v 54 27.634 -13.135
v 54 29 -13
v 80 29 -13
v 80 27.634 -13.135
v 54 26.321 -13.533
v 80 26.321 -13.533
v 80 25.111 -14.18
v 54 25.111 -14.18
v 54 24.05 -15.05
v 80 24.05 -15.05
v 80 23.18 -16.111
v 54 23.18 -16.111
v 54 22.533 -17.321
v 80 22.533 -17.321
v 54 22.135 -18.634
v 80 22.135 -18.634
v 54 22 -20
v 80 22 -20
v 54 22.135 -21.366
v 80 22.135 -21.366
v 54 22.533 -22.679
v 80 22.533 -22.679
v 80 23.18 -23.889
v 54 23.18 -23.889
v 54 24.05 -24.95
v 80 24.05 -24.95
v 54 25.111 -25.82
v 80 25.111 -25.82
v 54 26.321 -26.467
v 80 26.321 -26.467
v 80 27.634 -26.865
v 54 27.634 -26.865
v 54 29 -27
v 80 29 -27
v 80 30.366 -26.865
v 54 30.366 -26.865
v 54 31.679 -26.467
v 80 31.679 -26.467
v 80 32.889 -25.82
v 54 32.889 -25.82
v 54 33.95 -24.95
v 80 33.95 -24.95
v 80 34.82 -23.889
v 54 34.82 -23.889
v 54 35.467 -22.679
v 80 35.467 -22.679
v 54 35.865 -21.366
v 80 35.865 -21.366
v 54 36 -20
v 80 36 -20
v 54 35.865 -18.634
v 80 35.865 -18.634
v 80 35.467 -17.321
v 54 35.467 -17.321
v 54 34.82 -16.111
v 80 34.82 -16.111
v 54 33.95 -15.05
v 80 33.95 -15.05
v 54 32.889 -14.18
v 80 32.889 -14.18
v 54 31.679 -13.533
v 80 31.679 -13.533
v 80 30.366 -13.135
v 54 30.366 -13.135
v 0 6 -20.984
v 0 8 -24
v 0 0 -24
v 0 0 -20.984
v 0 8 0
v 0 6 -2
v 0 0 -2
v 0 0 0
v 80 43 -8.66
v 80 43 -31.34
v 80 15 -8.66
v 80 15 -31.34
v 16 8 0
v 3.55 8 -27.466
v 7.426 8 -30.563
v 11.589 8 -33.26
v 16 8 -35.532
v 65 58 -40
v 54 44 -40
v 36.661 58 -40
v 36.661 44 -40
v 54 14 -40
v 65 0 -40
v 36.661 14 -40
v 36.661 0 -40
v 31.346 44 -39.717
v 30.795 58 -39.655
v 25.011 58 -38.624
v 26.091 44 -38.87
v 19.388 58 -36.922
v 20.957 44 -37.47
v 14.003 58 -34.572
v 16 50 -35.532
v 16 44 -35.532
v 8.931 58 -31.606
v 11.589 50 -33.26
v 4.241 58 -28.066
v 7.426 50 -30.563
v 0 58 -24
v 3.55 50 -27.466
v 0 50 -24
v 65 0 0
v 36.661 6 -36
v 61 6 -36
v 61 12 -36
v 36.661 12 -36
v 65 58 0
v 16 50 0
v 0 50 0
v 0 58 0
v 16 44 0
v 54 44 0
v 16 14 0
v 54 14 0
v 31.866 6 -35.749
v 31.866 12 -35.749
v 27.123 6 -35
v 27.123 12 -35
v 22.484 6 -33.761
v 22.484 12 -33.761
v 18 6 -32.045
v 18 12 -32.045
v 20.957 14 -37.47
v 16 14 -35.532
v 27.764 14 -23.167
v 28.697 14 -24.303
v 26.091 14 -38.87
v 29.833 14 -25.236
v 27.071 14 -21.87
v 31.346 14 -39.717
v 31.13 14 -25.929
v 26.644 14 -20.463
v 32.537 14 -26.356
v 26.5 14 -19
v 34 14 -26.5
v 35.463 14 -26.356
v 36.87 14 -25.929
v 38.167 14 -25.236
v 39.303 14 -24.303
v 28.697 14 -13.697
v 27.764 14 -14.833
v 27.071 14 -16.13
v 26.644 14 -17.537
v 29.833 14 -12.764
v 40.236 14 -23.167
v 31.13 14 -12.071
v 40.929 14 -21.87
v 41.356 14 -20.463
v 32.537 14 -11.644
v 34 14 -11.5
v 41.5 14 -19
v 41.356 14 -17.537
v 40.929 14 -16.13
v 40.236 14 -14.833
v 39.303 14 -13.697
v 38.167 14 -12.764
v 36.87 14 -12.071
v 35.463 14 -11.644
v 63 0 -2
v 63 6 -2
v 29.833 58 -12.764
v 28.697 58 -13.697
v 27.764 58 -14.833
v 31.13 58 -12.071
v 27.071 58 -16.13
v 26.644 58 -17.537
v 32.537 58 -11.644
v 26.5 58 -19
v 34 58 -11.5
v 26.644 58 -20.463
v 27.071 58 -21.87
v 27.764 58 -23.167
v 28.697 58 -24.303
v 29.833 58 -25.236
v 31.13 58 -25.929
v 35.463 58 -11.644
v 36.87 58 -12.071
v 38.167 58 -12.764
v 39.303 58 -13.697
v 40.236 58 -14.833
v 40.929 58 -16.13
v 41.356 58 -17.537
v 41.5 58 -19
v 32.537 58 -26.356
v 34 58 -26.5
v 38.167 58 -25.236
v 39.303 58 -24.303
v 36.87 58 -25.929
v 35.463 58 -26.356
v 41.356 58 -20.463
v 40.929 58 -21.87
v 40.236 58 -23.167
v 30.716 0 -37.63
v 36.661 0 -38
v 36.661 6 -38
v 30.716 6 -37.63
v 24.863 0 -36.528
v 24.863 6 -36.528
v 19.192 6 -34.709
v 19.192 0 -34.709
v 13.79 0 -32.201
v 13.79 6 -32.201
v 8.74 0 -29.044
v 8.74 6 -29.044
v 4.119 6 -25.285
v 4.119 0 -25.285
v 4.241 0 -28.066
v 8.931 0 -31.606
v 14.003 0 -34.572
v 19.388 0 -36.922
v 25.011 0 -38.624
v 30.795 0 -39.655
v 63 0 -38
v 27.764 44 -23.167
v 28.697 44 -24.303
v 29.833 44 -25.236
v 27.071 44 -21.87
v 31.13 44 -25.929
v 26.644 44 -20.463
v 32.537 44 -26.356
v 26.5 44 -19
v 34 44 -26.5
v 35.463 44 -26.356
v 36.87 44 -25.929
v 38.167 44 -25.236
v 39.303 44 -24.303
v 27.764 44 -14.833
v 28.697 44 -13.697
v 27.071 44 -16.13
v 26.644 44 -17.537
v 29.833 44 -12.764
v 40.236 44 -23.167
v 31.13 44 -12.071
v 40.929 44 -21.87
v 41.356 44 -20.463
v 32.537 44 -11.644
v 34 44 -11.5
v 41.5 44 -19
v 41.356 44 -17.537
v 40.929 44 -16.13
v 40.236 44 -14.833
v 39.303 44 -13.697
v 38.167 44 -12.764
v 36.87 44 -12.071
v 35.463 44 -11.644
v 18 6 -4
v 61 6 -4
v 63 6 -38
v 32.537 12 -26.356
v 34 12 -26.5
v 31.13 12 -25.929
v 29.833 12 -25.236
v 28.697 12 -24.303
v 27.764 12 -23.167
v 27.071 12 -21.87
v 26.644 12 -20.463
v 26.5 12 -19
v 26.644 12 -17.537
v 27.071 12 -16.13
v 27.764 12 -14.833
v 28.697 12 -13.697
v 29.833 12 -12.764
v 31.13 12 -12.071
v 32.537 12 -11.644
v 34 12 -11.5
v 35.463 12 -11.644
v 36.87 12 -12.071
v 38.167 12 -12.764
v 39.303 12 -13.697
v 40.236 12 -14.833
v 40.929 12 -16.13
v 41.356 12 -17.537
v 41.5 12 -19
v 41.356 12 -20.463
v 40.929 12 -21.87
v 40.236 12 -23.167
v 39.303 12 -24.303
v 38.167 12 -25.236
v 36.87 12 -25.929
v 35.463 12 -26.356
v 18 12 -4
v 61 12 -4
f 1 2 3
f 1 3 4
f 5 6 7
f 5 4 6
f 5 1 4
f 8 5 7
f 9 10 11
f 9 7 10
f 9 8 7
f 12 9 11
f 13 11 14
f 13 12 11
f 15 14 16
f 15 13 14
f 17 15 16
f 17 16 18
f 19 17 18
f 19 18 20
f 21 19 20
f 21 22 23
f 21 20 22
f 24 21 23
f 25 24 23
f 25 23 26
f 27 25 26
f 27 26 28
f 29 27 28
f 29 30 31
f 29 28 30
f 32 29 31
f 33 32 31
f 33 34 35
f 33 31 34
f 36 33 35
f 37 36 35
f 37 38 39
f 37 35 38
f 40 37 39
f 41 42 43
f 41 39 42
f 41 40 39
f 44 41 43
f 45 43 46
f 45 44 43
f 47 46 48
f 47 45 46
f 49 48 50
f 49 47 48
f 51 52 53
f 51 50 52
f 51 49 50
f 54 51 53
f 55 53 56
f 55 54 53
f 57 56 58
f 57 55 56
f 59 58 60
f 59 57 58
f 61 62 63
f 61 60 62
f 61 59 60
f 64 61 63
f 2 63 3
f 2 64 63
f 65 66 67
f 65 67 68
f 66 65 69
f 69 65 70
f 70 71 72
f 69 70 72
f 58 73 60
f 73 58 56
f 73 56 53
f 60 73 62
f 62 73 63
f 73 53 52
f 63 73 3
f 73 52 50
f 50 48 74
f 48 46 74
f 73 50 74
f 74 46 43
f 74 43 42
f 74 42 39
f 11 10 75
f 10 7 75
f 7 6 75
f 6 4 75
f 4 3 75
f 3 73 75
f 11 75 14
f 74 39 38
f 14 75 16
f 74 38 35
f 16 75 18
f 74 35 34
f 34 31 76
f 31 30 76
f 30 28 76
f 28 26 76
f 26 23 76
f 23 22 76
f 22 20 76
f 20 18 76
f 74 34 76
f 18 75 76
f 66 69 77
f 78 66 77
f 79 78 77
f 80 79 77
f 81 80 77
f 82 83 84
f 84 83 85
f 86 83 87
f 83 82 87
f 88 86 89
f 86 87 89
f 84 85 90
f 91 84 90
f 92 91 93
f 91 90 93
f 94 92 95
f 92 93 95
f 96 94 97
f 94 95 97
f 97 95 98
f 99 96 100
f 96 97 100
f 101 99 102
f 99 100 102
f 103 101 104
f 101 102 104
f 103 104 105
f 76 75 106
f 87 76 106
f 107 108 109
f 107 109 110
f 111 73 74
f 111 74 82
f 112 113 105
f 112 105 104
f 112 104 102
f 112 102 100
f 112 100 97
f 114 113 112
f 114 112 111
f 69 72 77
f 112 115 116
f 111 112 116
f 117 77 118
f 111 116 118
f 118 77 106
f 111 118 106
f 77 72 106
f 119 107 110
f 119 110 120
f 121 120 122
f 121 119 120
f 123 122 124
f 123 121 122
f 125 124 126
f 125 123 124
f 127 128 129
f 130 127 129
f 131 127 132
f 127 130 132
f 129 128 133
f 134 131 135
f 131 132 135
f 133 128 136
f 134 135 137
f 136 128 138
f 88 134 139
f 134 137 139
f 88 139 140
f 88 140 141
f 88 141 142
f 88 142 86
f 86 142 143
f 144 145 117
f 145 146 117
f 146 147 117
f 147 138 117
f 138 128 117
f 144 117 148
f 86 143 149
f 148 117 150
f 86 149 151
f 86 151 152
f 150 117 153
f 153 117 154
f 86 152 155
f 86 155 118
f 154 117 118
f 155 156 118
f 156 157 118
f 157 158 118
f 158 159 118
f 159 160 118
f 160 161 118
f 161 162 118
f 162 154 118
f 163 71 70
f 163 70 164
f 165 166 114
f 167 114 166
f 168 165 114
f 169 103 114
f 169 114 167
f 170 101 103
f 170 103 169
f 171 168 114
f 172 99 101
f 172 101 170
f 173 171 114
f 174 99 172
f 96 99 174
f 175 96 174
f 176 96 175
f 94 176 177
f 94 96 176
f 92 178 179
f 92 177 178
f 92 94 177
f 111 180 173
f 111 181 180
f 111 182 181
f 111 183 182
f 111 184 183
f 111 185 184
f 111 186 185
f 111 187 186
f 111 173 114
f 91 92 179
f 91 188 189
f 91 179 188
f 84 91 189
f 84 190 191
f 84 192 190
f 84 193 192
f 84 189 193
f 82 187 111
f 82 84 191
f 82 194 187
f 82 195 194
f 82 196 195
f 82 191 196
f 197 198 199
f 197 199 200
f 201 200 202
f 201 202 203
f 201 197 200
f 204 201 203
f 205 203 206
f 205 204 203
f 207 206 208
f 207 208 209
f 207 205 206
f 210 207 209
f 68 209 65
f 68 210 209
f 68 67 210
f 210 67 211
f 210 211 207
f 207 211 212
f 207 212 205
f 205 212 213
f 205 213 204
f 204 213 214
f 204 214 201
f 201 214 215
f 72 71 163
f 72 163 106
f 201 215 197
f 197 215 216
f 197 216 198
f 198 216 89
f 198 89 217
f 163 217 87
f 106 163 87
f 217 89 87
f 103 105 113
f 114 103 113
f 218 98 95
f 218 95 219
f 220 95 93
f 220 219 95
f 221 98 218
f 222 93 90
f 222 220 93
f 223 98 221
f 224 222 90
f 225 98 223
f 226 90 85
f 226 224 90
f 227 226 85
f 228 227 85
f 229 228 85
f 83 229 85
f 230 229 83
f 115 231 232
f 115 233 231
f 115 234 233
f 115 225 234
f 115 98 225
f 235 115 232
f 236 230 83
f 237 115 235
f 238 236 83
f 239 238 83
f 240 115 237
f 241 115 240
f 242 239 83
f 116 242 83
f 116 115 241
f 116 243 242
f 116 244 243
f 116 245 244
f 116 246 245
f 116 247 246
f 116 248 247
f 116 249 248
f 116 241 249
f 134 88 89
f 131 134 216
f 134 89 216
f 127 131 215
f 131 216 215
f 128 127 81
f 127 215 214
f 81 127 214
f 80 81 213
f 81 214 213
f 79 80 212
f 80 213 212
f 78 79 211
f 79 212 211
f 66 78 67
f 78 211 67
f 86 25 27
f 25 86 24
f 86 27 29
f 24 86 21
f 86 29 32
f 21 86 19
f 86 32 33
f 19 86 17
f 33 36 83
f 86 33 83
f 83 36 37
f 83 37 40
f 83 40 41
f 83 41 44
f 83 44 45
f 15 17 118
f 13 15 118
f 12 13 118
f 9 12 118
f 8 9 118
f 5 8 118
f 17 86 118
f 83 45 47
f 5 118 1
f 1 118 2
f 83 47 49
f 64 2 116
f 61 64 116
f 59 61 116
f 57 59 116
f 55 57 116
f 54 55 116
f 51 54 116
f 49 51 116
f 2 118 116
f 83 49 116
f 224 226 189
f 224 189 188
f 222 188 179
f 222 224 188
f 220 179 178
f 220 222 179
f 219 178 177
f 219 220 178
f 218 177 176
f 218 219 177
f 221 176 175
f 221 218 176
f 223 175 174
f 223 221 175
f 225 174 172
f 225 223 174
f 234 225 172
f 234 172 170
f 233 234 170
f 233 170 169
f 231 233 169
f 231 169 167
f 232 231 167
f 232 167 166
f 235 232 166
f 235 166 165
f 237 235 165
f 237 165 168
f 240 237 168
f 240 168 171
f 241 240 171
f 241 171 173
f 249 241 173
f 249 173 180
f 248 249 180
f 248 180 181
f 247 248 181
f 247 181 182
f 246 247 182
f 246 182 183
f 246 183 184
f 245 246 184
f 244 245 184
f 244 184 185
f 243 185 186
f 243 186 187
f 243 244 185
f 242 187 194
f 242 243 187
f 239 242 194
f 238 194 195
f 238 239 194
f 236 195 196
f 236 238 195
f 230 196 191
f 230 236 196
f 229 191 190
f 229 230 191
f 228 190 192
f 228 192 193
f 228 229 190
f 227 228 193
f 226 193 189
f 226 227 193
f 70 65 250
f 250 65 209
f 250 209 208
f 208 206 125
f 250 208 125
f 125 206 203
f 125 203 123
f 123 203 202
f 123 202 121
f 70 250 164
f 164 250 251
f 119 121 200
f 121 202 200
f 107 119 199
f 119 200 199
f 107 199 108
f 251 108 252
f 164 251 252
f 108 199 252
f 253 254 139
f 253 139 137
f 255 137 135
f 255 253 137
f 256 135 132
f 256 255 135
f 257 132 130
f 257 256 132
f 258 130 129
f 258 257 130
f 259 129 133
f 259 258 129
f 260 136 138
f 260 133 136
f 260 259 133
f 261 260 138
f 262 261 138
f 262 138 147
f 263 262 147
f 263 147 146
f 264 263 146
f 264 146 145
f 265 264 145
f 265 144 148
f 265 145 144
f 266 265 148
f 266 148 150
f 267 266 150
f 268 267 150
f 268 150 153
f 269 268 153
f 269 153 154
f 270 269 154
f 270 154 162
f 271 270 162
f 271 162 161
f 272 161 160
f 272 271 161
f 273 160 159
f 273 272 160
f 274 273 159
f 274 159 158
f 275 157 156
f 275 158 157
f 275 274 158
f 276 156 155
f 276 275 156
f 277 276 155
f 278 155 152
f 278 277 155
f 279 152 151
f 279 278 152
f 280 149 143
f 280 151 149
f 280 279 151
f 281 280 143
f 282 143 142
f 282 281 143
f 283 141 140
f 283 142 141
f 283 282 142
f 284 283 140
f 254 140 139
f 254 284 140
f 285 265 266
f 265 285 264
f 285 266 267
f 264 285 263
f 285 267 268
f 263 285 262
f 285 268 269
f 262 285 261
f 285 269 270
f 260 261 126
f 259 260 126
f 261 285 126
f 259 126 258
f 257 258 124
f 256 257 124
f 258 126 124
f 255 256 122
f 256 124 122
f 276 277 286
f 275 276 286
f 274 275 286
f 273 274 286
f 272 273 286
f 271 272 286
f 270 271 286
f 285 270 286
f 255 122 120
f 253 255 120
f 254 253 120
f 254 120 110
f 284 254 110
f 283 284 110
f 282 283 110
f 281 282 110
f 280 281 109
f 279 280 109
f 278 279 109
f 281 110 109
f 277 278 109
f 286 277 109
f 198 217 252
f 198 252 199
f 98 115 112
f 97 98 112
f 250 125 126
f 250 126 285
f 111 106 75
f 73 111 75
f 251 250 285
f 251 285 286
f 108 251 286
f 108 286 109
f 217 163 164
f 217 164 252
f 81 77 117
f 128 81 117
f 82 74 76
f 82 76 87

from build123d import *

# Parameters (mm, degrees)
SKETCH1_R           = 7.5
BOSS_EXTRUDE1_DEPTH = 58
SKETCH2_W           = 38
SKETCH2_H           = 30
SKETCH2_W_2         = 16
SKETCH2_H_2         = 42
CUT_EXTRUDE1_DEPTH  = 58
CUT_EXTRUDE2_DEPTH  = 58
SKETCH4_R           = 7
CUT_EXTRUDE3_DEPTH  = 108
CUT_EXTRUDE4_DEPTH  = 6
CUT_EXTRUDE5_DEPTH  = 12


with BuildPart() as part:
    # Sketch1 → Boss-Extrude1 (new body)
    with BuildSketch(Plane(origin=(0, 0, 0), x_dir=(1, 0, 0), z_dir=(0, 1, 0))):
        with BuildLine():
            Line((0, 0), (65, 0))
            Line((65, 0), (80, 8.660254038))
            Line((80, 8.660254038), (80, 31.339745962))
            Line((80, 31.339745962), (65, 40))
            Line((65, 40), (36.66060556, 40))
            ThreePointArc((36.66060556, 40), (16.66060556, 35.82575695), (0, 24))
            Line((0, 24), (0, 0))
        make_face()
        with Locations(Location((34, 19, 0), (0, 0, 90))):
            Circle(SKETCH1_R, mode=Mode.SUBTRACT)
    extrude(amount=BOSS_EXTRUDE1_DEPTH)

    # Sketch2 → Cut-Extrude1 (cut)
    with BuildSketch(Plane.XY):
        with Locations((35, 29)):
            Rectangle(SKETCH2_W, SKETCH2_H)
        with Locations((8, 29)):
            Rectangle(SKETCH2_W_2, SKETCH2_H_2)
    extrude(amount=-CUT_EXTRUDE1_DEPTH, mode=Mode.SUBTRACT)

    # Sketch3 → Cut-Extrude2 (cut)
    with BuildSketch(Plane.XY):
        Polygon((65, 58), (80, 58), (80, 43), align=None)
        Polygon((65, 0), (80, 0), (80, 15), align=None)
    extrude(amount=-CUT_EXTRUDE2_DEPTH, mode=Mode.SUBTRACT)

    # Sketch4 → Cut-Extrude3 (cut)
    with BuildSketch(Plane(origin=(0, 0, 0), x_dir=(0, 0, -1), z_dir=(1, 0, 0))):
        with Locations(Location((20, 29, 0), (0, 0, 180))):
            Circle(SKETCH4_R)
    extrude(amount=CUT_EXTRUDE3_DEPTH, mode=Mode.SUBTRACT)

    # Sketch5 → Cut-Extrude4 (cut)
    with BuildSketch(Plane(origin=(0, 0, 0), x_dir=(1, 0, 0), z_dir=(0, 1, 0))):
        with BuildLine():
            Line((0, 20.98386677), (0, 2))
            Line((0, 2), (63, 2))
            Line((63, 2), (63, 38))
            Line((63, 38), (36.66060556, 38))
            ThreePointArc((36.66060556, 38), (16.452013389, 33.538635744), (0, 20.98386677))
        make_face()
    extrude(amount=CUT_EXTRUDE4_DEPTH, mode=Mode.SUBTRACT)

    # Sketch7 → Cut-Extrude5 (cut)
    with BuildSketch(Plane(origin=(0, 0, 0), x_dir=(1, 0, 0), z_dir=(0, 1, 0))):
        with BuildLine():
            Line((18, 32.044997326), (18, 4))
            Line((18, 4), (61, 4))
            Line((61, 4), (61, 36))
            Line((61, 36), (36.66060556, 36))
            ThreePointArc((36.66060556, 36), (27.123044996, 35.000388204), (18, 32.044997326))
        make_face()
    extrude(amount=CUT_EXTRUDE5_DEPTH, mode=Mode.SUBTRACT)


solid = part.part
